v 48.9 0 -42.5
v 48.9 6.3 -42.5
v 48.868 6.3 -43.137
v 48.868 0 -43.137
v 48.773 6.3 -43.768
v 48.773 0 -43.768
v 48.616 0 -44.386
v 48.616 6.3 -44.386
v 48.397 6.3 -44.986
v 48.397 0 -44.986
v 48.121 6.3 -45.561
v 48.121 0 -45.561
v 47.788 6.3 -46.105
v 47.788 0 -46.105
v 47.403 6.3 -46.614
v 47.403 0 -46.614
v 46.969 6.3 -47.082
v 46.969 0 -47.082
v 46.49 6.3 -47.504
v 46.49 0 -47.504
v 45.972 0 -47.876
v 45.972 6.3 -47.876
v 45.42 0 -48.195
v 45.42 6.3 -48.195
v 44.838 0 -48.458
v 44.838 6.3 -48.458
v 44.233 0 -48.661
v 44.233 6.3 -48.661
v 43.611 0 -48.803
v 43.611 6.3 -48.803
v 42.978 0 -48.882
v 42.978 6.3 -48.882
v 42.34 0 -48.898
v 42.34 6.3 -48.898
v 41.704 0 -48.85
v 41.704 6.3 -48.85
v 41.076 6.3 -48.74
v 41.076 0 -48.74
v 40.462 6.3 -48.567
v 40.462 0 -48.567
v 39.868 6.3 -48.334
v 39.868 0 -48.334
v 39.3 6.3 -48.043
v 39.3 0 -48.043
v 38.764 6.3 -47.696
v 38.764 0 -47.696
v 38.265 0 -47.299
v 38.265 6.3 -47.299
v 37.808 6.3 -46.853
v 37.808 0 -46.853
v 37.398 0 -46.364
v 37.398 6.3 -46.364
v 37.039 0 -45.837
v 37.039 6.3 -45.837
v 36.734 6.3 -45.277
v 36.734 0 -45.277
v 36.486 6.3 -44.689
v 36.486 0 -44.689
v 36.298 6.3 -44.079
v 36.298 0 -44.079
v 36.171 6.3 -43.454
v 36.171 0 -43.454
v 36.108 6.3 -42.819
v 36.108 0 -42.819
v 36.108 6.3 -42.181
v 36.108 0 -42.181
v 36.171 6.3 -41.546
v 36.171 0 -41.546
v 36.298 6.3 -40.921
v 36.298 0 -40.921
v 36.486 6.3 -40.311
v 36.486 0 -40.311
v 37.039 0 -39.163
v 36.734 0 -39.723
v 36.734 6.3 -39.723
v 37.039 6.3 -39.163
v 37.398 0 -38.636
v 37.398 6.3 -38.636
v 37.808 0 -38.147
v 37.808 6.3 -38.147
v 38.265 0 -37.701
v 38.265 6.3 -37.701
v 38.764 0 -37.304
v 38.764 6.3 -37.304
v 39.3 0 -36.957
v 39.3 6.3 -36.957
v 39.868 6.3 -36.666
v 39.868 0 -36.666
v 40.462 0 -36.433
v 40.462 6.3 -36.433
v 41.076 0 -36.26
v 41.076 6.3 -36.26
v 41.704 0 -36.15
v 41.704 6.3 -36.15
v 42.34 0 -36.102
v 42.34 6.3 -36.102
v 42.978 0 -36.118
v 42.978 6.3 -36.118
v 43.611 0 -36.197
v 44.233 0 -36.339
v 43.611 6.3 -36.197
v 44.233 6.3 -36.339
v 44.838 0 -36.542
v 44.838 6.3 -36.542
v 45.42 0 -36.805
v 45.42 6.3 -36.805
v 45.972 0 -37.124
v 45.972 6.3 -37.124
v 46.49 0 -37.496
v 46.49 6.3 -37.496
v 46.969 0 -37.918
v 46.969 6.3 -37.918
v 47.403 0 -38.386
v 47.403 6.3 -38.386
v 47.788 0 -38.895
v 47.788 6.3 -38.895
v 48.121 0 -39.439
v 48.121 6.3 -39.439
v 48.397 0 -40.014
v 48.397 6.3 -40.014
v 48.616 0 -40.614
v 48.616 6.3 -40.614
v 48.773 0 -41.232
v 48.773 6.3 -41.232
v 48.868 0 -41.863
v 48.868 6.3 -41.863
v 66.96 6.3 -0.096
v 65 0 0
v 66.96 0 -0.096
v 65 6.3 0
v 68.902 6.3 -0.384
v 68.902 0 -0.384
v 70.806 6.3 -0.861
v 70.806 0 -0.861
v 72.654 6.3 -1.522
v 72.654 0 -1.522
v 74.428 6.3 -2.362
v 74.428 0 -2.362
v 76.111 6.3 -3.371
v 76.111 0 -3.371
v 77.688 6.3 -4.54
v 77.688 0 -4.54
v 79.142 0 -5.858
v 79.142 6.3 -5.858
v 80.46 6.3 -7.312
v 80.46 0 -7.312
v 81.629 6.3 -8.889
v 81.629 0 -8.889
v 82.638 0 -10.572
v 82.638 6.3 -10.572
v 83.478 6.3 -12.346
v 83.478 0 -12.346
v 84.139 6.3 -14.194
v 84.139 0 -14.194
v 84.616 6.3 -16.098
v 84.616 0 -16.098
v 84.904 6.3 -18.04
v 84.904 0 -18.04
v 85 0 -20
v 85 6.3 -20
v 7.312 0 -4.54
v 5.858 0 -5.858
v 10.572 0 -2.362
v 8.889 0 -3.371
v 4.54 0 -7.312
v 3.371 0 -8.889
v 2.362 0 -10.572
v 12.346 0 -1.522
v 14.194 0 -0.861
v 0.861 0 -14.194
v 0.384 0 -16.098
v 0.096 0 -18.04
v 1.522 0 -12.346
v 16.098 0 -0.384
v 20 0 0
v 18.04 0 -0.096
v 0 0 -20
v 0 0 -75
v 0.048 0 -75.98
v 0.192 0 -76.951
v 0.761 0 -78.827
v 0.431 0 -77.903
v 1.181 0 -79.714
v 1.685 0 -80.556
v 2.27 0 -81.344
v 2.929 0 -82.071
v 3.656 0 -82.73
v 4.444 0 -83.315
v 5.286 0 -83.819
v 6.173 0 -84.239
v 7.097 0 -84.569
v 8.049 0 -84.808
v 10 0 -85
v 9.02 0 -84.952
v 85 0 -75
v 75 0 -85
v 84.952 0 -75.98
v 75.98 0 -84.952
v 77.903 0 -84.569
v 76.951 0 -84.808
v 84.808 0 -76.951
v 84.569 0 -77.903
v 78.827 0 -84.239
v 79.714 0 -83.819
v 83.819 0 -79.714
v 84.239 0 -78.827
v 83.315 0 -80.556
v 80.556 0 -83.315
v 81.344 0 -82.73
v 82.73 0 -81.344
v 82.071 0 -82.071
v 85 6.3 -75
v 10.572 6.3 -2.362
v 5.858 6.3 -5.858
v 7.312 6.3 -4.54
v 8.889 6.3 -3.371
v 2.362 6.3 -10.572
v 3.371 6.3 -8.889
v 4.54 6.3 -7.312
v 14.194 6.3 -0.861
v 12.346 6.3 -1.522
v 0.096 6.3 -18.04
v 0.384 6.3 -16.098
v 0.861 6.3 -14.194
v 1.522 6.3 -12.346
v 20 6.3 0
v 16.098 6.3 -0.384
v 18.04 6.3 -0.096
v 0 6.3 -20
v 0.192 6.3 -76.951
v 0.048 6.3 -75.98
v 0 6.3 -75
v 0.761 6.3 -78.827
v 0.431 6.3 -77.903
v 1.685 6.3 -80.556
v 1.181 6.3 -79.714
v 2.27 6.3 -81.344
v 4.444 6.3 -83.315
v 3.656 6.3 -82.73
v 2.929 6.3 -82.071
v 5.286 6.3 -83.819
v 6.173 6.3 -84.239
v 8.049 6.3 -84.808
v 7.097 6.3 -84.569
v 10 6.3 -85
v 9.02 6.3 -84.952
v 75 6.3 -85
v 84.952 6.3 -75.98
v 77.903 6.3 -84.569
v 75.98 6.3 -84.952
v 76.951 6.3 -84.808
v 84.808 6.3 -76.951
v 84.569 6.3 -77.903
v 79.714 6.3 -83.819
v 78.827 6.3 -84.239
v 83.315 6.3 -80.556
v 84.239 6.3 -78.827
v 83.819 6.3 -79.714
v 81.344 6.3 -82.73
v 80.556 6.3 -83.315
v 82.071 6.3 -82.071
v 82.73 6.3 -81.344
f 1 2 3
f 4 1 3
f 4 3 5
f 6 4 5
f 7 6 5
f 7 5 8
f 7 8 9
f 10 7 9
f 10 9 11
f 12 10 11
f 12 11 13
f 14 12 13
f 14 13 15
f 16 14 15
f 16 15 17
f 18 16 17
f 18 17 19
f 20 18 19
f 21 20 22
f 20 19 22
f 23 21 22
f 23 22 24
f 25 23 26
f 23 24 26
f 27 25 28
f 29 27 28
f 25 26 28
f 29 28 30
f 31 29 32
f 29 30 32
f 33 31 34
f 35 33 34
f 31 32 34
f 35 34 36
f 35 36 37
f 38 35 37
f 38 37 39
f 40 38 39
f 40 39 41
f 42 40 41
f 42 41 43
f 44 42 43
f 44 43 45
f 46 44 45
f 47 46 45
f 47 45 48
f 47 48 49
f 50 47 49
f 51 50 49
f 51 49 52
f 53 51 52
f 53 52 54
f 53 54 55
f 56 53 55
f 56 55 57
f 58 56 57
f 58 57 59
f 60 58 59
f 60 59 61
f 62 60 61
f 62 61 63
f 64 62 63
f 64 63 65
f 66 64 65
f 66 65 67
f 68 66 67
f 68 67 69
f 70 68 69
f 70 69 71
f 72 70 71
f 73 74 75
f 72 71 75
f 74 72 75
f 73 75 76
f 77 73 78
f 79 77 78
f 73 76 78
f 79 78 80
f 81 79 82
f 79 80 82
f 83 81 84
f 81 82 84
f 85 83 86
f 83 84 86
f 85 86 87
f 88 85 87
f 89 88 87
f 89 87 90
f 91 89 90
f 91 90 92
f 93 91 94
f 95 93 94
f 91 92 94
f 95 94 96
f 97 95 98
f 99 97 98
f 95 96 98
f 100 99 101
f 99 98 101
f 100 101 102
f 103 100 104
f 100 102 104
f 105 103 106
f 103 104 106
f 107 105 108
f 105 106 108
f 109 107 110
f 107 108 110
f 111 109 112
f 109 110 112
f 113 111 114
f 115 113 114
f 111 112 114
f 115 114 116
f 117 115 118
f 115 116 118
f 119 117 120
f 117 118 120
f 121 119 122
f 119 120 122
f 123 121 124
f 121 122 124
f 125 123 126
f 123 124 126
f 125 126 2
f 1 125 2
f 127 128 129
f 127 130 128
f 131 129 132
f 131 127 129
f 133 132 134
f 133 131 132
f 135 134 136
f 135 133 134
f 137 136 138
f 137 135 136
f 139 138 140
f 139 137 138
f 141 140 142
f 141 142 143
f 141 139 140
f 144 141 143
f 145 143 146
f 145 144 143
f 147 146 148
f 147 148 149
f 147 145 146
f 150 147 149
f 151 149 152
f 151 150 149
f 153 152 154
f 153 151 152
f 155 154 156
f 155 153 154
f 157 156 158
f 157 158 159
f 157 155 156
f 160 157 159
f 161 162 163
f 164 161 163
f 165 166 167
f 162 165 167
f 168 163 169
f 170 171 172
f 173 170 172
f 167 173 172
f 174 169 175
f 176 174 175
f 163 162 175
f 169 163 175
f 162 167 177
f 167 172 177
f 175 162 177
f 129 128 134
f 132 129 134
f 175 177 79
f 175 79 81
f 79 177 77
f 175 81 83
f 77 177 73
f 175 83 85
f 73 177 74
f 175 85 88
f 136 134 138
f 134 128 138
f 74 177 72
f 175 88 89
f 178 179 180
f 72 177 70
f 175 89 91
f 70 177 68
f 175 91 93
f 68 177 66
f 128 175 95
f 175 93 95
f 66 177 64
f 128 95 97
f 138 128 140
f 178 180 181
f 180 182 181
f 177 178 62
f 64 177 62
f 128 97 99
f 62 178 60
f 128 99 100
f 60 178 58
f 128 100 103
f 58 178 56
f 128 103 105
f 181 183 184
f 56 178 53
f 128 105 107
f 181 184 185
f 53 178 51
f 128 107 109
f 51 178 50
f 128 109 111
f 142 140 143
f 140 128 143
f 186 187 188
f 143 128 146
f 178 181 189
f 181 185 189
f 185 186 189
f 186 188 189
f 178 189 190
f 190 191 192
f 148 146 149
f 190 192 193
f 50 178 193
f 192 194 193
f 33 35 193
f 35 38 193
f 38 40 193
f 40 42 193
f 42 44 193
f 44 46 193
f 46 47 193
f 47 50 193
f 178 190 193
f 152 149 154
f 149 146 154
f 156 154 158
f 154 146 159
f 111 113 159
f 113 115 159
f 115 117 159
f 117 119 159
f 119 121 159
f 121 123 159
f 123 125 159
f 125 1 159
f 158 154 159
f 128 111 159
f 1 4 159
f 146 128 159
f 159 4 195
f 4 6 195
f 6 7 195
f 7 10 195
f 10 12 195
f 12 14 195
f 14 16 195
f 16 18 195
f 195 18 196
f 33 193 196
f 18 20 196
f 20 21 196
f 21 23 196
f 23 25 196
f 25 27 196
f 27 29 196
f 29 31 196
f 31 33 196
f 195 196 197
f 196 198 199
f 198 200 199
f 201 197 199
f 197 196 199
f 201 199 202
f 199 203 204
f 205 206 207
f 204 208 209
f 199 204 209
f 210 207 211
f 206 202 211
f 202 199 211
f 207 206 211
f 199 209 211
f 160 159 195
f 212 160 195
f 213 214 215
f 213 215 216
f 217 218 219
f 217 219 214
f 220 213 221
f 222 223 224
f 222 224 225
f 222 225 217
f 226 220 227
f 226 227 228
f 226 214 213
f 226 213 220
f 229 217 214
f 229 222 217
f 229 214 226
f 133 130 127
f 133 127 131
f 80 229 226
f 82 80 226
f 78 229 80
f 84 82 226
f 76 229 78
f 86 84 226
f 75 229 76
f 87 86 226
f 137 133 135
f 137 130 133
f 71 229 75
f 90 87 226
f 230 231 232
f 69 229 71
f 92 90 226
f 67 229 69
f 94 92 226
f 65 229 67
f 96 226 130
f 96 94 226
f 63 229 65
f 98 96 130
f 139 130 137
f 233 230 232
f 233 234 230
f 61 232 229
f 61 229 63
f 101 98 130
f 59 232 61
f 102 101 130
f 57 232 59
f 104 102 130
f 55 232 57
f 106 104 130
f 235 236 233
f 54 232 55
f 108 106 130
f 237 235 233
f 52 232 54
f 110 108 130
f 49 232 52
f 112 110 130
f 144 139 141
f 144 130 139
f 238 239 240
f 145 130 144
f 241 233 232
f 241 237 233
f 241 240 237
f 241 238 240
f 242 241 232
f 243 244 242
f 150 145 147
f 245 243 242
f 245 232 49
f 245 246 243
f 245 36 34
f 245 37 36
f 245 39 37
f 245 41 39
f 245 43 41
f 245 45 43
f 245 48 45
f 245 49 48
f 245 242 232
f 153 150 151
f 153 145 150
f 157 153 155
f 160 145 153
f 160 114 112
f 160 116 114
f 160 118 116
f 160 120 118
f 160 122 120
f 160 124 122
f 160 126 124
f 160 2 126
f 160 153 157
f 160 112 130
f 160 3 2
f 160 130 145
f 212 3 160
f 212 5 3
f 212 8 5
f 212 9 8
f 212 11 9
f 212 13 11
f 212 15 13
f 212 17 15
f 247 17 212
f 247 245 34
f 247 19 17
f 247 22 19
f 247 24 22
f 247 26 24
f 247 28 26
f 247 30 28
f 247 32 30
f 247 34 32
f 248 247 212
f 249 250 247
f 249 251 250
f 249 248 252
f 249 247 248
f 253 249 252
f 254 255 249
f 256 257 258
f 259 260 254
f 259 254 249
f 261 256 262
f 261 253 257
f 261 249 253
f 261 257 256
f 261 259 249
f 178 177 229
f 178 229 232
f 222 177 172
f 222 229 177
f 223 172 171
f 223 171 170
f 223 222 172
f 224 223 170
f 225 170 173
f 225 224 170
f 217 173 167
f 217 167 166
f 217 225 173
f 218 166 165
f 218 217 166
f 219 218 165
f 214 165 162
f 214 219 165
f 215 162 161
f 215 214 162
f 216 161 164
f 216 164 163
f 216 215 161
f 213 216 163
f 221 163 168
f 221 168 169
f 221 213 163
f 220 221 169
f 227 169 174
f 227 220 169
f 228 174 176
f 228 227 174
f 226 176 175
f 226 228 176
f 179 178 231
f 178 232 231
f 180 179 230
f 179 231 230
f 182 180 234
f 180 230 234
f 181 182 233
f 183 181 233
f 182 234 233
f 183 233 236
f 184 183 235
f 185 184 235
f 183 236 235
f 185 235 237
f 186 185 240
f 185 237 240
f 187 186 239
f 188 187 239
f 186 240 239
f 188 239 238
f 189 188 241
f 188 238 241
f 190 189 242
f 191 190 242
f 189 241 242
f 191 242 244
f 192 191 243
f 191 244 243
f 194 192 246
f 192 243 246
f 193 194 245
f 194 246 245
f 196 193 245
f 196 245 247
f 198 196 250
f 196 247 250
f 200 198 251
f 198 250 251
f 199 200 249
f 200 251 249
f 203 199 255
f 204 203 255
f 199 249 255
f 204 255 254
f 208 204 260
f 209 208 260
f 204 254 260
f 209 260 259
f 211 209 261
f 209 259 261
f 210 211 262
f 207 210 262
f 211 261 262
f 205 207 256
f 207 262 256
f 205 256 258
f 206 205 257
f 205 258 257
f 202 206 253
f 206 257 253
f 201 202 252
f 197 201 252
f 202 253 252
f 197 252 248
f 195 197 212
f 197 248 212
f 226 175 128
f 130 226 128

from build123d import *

# Parameters (mm, degrees)
SKETCH1_W           = 85
SKETCH1_H           = 85
BOSS_EXTRUDE1_DEPTH = 6.3
CUT_EXTRUDE1_REACH  = 8.3
SKETCH2_R           = 6.4
FILLET1_R           = 10
FILLET2_R           = 20


with BuildPart() as part:
    # Sketch1 → Boss-Extrude1 (new body)
    with BuildSketch(Plane(origin=(0, 0, 0), x_dir=(1, 0, 0), z_dir=(0, 1, 0))):
        with Locations((42.5, 42.5)):
            Rectangle(SKETCH1_W, SKETCH1_H)
    extrude(amount=BOSS_EXTRUDE1_DEPTH)

    # Sketch2 → Cut-Extrude1 (cut, up to next)
    with BuildSketch(Plane(origin=(0, 6.3, 0), x_dir=(1, 0, 0), z_dir=(0, 1, 0)), mode=Mode.PRIVATE) as cut_extrude1_sk1:
        with Locations((42.5, 42.5)):
            Circle(SKETCH2_R)
    cut_extrude1_tool1 = extrude(cut_extrude1_sk1.sketch, amount=-CUT_EXTRUDE1_REACH, mode=Mode.PRIVATE) & part.part
    add(cut_extrude1_tool1.solids().sort_by_distance((42.5, 6.3, -42.5))[0], mode=Mode.SUBTRACT)

    # Fillet1
    fillet1_edges = [part.edges().sort_by_distance(p)[0] for p in [
        (0, 3.15, -85),
        (85, 3.15, -85),
    ]]
    fillet(fillet1_edges, radius=FILLET1_R)

    # Fillet2
    fillet2_edges = [part.edges().sort_by_distance(p)[0] for p in [
        (85, 3.15, 0),
        (0, 3.15, 0),
    ]]
    fillet(fillet2_edges, radius=FILLET2_R)


solid = part.part
